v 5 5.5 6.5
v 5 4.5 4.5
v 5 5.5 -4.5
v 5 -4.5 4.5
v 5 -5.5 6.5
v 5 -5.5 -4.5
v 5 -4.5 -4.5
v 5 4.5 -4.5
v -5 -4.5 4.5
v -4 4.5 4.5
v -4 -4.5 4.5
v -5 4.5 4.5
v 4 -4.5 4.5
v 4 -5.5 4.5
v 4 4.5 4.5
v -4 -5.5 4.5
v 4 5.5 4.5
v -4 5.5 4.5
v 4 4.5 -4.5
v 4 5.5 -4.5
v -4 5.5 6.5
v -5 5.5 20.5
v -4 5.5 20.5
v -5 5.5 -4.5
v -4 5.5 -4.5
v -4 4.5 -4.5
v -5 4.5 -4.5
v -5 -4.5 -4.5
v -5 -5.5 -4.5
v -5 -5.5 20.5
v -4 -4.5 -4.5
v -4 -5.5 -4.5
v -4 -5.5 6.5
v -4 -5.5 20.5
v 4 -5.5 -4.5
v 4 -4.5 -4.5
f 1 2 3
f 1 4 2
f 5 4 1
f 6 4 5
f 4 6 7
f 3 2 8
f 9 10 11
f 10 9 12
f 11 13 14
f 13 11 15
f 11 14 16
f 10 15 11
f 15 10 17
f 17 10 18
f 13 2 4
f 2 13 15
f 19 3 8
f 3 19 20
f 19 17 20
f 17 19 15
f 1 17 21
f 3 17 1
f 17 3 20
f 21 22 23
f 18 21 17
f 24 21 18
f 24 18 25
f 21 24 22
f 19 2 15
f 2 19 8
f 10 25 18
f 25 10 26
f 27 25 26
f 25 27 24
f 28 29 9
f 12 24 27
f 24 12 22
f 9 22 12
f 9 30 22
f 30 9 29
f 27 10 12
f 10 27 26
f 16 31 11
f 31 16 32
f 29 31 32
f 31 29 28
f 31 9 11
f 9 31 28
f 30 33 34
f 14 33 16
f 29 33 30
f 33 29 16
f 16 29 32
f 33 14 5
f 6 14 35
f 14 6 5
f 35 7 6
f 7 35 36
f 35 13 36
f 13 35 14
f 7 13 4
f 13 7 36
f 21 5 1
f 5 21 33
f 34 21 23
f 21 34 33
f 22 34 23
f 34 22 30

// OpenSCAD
// Angelo Nicolì 2023 - Licensed GPL-2.0

// Modify Input DATA to change the shape of the chair




module Chair_01(){
    // INPUT DATA

    Table_Leg = [1,1,9];      // lenght, width and height of legs
    Table_Top_Height = 2;     //  Height of theSeat

    Leg_Distance_x = 9;        
    Leg_Distance_y = 10;     

    seat_height = 14;         // Backpost size 
    seat_width = 1;           // Backpost width (x axis)


    // OUTPUT DATA

    translate([Leg_Distance_x*0.5,Leg_Distance_y*0.5,0])
    color("PowderBlue")
    cube([Table_Leg[0],Table_Leg[1],Table_Leg[2]],center=true);

    translate([-Leg_Distance_x*0.5,Leg_Distance_y*0.5,0])
    color("PowderBlue")
    cube([Table_Leg[0],Table_Leg[1],Table_Leg[2]],center=true);

    translate([-Leg_Distance_x*0.5,-Leg_Distance_y*0.5,0])
    color("PowderBlue")
    cube([Table_Leg[0],Table_Leg[1],Table_Leg[2]],center=true);

    translate([Leg_Distance_x*0.5,-Leg_Distance_y*0.5,0])
    color("PowderBlue")
    cube([Table_Leg[0],Table_Leg[1],Table_Leg[2]],center=true);

    Table_Upper = [Leg_Distance_x + Table_Leg[0],Leg_Distance_y +Table_Leg[1],Table_Top_Height];

    seat = [seat_width,Leg_Distance_y+Table_Leg[1],seat_height];

    translate([0,0,Table_Leg[2]*0.5+Table_Top_Height*0.5])
    color("PowderBlue")
    cube([Table_Upper[0],Table_Upper[1],Table_Upper[2]],center=true);

    translate([-Table_Upper[0]*0.5+seat[0]*0.5,0,Table_Leg[2]*0.5+Table_Top_Height+seat_height*0.5])
    color("YellowGreen")
    cube([seat[0],seat[1],seat[2]],center=true);

}

Chair_01();
